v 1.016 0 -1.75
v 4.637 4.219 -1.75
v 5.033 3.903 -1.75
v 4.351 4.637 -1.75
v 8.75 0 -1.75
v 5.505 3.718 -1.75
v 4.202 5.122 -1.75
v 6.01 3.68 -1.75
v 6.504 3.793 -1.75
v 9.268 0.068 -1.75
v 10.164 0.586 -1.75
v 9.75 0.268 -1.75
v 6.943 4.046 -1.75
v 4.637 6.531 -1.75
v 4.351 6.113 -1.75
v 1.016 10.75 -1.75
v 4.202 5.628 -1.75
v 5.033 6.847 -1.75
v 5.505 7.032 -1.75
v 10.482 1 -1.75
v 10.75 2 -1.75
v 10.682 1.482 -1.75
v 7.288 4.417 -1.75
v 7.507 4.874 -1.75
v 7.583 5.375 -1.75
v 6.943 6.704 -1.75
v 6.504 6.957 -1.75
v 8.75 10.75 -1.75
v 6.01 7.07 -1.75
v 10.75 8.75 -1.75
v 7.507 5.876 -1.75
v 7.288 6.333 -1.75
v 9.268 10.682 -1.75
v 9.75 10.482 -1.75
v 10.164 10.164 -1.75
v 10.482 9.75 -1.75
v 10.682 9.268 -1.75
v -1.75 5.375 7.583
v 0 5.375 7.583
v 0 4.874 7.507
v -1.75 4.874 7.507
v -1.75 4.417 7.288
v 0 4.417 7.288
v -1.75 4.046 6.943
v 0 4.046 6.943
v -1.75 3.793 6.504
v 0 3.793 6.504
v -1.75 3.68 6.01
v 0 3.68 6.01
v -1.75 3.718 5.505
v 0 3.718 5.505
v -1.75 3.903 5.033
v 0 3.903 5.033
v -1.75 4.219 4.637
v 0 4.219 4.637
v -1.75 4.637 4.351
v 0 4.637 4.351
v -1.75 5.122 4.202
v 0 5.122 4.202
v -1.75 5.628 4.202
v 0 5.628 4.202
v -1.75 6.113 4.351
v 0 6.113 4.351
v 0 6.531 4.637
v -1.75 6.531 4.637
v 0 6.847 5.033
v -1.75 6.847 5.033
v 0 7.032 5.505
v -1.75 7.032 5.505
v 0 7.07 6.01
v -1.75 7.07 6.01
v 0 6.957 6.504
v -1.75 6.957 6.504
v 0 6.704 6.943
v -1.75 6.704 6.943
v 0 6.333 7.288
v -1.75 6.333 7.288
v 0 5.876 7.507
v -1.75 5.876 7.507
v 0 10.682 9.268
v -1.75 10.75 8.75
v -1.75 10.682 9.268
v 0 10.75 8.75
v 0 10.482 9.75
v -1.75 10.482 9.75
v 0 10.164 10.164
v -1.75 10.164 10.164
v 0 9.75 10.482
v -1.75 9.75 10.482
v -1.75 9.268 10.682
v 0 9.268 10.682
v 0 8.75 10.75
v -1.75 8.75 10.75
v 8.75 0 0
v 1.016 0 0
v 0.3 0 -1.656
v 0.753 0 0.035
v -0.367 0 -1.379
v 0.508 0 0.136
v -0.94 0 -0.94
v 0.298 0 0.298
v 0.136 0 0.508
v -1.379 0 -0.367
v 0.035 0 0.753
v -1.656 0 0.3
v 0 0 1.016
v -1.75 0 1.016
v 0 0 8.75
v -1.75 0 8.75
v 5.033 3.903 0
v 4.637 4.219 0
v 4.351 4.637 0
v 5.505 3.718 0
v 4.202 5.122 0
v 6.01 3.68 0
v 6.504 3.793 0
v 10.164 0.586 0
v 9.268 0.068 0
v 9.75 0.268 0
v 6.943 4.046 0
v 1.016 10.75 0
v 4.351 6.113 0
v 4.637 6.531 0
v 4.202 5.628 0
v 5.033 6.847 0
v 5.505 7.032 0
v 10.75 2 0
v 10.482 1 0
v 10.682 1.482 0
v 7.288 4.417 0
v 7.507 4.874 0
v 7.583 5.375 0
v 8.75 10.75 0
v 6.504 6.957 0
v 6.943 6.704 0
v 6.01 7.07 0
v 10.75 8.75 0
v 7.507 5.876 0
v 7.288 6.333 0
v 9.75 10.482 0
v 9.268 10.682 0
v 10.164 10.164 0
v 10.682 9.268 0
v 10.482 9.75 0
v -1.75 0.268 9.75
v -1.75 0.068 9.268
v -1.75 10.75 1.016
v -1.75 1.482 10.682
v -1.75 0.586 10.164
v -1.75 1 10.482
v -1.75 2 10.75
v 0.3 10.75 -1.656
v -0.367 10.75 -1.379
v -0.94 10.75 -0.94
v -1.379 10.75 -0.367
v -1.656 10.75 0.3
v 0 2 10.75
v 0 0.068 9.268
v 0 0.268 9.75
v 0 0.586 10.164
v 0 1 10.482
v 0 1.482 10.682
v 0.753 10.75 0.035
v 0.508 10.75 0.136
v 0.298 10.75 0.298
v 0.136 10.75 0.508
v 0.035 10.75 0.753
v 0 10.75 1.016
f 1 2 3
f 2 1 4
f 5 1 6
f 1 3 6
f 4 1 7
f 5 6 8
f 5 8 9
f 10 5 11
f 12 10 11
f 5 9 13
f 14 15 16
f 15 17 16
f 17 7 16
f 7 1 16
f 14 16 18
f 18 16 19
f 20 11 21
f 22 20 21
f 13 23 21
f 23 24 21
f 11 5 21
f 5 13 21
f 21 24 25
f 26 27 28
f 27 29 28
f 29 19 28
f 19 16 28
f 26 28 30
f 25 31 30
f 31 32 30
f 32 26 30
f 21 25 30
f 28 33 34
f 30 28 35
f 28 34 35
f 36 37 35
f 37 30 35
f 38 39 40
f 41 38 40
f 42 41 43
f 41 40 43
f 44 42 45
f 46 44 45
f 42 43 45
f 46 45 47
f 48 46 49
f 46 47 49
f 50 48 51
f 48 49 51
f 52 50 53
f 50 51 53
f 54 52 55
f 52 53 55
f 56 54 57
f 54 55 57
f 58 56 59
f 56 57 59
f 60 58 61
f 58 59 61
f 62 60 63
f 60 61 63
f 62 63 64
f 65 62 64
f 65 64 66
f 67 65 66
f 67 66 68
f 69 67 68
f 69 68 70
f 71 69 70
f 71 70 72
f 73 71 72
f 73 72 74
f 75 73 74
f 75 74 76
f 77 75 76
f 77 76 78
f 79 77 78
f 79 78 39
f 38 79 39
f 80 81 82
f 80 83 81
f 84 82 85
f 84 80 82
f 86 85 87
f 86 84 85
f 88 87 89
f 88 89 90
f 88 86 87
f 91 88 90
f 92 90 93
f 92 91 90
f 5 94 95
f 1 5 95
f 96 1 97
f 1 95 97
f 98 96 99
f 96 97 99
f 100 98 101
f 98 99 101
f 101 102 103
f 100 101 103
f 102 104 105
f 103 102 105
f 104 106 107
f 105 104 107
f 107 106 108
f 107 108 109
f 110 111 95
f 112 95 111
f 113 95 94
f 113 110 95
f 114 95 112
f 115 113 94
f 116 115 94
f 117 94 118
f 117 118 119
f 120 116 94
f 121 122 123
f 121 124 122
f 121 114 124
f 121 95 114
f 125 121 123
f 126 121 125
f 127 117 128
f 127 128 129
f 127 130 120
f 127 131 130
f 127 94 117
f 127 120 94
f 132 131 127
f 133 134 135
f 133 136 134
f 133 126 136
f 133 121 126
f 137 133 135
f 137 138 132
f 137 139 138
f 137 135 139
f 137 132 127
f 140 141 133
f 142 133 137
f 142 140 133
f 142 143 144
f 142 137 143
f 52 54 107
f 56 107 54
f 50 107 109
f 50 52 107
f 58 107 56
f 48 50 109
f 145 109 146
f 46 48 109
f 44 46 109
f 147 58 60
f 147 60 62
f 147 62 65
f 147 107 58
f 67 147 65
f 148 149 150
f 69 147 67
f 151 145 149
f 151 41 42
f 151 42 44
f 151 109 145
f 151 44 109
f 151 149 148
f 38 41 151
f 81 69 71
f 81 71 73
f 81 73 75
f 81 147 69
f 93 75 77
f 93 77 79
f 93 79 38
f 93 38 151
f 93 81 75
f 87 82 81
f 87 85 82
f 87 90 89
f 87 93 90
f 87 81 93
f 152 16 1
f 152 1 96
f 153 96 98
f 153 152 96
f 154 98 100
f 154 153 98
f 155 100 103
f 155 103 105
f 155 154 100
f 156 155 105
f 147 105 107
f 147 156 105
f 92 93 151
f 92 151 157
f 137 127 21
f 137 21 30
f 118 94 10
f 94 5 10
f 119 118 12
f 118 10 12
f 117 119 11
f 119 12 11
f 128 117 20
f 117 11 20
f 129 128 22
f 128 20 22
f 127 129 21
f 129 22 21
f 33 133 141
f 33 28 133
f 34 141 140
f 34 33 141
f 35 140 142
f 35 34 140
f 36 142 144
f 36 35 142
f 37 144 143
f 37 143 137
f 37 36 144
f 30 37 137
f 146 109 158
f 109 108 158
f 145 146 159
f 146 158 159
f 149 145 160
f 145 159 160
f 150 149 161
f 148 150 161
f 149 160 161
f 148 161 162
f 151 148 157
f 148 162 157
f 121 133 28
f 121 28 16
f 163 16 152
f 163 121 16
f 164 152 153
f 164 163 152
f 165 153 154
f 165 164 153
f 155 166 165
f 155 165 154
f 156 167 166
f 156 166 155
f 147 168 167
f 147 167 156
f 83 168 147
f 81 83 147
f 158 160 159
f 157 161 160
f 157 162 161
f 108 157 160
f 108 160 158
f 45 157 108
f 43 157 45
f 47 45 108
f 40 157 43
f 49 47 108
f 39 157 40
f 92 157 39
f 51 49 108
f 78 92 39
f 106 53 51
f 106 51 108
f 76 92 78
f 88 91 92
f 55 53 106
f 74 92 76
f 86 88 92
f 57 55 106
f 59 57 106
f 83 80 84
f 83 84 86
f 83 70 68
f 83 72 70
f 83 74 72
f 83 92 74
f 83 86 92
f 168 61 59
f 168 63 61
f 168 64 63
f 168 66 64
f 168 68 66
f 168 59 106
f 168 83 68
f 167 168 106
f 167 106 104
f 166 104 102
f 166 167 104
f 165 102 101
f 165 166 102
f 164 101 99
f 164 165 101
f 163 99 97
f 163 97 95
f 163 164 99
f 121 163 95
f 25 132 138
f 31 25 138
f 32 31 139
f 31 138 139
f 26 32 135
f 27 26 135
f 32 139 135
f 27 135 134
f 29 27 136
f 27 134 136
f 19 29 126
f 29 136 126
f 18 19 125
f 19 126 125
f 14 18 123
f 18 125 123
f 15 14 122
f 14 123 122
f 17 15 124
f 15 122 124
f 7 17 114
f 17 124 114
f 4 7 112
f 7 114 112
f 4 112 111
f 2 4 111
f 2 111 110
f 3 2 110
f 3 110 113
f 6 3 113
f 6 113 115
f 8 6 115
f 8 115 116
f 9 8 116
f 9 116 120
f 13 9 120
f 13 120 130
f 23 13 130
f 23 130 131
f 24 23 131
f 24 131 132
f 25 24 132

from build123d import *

# Parameters (mm, degrees)
SKETCH1_W                      = 10.75
SKETCH1_H                      = 10.75
BASE_FLANGE1_DEPTH             = 1.75
EDGE_FLANGE1_STRIP_W           = 9.032
EDGE_FLANGE1_STRIP_H           = 1.75
EDGE_FLANGE1_STRIP_CUT_DEPTH   = 10.75
EDGE_FLANGE1_DEPTH             = 10.75
M3_CLEARANCE_HOLE1_D           = 3.4
M3_CLEARANCE_HOLE1_ON_FACE_2_D = 3.4
FILLET1_R                      = 2


# Sheet-metal steps are written as plain solids
with BuildPart() as part:
    # Sketch1 → Base-Flange1 (new body)
    with BuildSketch(Plane.XY):
        with Locations((5.375, 5.375)):
            Rectangle(SKETCH1_W, SKETCH1_H)
    extrude(amount=-BASE_FLANGE1_DEPTH)

    # Edge-Flange1 strip (across the edge) → Edge-Flange1 strip cut (cut)
    with BuildSketch(Plane.XZ.offset(-10.75)):
        with Locations((-3.5, -0.875)):
            Rectangle(EDGE_FLANGE1_STRIP_W, EDGE_FLANGE1_STRIP_H)
    extrude(amount=EDGE_FLANGE1_STRIP_CUT_DEPTH, mode=Mode.SUBTRACT)

    # Edge-Flange1 section (across the edge) → Edge-Flange1 (add)
    with BuildSketch(Plane.XZ.offset(-10.75)):
        with BuildLine():
            Line((-1.75, 1.016), (-1.75, 10.75))
            Line((-1.75, 10.75), (0, 10.75))
            Line((0, 10.75), (0, 1.016))
            ThreePointArc((0, 1.016), (0.29757951, 0.29757951), (1.016, 0))
            Line((1.016, 0), (1.016, -1.75))
            ThreePointArc((1.016, -1.75), (-0.939857357, -0.939857357), (-1.75, 1.016))
        make_face()
    extrude(amount=EDGE_FLANGE1_DEPTH)

    # M3 Clearance Hole1 (through all)
    with Locations(Plane(origin=(5.883, 5.375, -1.75), x_dir=(-1, 0, 0), z_dir=(0, 0, -1))):
        with Locations((0, 0)):
            Hole(M3_CLEARANCE_HOLE1_D / 2)

    # M3 Clearance Hole1 on face 2 (through all)
    with Locations(Plane(origin=(-1.75, 5.375, 5.883), x_dir=(0, 0, -1), z_dir=(-1, 0, 0))):
        with Locations((0, 0)):
            Hole(M3_CLEARANCE_HOLE1_ON_FACE_2_D / 2)

    # Fillet1
    fillet1_edges = [part.edges().sort_by_distance(p)[0] for p in [
        (-0.875, 10.75, 10.75),
        (-0.875, 0, 10.75),
        (10.75, 10.75, -0.875),
        (10.75, 0, -0.875),
    ]]
    fillet(fillet1_edges, radius=FILLET1_R)


solid = part.part
